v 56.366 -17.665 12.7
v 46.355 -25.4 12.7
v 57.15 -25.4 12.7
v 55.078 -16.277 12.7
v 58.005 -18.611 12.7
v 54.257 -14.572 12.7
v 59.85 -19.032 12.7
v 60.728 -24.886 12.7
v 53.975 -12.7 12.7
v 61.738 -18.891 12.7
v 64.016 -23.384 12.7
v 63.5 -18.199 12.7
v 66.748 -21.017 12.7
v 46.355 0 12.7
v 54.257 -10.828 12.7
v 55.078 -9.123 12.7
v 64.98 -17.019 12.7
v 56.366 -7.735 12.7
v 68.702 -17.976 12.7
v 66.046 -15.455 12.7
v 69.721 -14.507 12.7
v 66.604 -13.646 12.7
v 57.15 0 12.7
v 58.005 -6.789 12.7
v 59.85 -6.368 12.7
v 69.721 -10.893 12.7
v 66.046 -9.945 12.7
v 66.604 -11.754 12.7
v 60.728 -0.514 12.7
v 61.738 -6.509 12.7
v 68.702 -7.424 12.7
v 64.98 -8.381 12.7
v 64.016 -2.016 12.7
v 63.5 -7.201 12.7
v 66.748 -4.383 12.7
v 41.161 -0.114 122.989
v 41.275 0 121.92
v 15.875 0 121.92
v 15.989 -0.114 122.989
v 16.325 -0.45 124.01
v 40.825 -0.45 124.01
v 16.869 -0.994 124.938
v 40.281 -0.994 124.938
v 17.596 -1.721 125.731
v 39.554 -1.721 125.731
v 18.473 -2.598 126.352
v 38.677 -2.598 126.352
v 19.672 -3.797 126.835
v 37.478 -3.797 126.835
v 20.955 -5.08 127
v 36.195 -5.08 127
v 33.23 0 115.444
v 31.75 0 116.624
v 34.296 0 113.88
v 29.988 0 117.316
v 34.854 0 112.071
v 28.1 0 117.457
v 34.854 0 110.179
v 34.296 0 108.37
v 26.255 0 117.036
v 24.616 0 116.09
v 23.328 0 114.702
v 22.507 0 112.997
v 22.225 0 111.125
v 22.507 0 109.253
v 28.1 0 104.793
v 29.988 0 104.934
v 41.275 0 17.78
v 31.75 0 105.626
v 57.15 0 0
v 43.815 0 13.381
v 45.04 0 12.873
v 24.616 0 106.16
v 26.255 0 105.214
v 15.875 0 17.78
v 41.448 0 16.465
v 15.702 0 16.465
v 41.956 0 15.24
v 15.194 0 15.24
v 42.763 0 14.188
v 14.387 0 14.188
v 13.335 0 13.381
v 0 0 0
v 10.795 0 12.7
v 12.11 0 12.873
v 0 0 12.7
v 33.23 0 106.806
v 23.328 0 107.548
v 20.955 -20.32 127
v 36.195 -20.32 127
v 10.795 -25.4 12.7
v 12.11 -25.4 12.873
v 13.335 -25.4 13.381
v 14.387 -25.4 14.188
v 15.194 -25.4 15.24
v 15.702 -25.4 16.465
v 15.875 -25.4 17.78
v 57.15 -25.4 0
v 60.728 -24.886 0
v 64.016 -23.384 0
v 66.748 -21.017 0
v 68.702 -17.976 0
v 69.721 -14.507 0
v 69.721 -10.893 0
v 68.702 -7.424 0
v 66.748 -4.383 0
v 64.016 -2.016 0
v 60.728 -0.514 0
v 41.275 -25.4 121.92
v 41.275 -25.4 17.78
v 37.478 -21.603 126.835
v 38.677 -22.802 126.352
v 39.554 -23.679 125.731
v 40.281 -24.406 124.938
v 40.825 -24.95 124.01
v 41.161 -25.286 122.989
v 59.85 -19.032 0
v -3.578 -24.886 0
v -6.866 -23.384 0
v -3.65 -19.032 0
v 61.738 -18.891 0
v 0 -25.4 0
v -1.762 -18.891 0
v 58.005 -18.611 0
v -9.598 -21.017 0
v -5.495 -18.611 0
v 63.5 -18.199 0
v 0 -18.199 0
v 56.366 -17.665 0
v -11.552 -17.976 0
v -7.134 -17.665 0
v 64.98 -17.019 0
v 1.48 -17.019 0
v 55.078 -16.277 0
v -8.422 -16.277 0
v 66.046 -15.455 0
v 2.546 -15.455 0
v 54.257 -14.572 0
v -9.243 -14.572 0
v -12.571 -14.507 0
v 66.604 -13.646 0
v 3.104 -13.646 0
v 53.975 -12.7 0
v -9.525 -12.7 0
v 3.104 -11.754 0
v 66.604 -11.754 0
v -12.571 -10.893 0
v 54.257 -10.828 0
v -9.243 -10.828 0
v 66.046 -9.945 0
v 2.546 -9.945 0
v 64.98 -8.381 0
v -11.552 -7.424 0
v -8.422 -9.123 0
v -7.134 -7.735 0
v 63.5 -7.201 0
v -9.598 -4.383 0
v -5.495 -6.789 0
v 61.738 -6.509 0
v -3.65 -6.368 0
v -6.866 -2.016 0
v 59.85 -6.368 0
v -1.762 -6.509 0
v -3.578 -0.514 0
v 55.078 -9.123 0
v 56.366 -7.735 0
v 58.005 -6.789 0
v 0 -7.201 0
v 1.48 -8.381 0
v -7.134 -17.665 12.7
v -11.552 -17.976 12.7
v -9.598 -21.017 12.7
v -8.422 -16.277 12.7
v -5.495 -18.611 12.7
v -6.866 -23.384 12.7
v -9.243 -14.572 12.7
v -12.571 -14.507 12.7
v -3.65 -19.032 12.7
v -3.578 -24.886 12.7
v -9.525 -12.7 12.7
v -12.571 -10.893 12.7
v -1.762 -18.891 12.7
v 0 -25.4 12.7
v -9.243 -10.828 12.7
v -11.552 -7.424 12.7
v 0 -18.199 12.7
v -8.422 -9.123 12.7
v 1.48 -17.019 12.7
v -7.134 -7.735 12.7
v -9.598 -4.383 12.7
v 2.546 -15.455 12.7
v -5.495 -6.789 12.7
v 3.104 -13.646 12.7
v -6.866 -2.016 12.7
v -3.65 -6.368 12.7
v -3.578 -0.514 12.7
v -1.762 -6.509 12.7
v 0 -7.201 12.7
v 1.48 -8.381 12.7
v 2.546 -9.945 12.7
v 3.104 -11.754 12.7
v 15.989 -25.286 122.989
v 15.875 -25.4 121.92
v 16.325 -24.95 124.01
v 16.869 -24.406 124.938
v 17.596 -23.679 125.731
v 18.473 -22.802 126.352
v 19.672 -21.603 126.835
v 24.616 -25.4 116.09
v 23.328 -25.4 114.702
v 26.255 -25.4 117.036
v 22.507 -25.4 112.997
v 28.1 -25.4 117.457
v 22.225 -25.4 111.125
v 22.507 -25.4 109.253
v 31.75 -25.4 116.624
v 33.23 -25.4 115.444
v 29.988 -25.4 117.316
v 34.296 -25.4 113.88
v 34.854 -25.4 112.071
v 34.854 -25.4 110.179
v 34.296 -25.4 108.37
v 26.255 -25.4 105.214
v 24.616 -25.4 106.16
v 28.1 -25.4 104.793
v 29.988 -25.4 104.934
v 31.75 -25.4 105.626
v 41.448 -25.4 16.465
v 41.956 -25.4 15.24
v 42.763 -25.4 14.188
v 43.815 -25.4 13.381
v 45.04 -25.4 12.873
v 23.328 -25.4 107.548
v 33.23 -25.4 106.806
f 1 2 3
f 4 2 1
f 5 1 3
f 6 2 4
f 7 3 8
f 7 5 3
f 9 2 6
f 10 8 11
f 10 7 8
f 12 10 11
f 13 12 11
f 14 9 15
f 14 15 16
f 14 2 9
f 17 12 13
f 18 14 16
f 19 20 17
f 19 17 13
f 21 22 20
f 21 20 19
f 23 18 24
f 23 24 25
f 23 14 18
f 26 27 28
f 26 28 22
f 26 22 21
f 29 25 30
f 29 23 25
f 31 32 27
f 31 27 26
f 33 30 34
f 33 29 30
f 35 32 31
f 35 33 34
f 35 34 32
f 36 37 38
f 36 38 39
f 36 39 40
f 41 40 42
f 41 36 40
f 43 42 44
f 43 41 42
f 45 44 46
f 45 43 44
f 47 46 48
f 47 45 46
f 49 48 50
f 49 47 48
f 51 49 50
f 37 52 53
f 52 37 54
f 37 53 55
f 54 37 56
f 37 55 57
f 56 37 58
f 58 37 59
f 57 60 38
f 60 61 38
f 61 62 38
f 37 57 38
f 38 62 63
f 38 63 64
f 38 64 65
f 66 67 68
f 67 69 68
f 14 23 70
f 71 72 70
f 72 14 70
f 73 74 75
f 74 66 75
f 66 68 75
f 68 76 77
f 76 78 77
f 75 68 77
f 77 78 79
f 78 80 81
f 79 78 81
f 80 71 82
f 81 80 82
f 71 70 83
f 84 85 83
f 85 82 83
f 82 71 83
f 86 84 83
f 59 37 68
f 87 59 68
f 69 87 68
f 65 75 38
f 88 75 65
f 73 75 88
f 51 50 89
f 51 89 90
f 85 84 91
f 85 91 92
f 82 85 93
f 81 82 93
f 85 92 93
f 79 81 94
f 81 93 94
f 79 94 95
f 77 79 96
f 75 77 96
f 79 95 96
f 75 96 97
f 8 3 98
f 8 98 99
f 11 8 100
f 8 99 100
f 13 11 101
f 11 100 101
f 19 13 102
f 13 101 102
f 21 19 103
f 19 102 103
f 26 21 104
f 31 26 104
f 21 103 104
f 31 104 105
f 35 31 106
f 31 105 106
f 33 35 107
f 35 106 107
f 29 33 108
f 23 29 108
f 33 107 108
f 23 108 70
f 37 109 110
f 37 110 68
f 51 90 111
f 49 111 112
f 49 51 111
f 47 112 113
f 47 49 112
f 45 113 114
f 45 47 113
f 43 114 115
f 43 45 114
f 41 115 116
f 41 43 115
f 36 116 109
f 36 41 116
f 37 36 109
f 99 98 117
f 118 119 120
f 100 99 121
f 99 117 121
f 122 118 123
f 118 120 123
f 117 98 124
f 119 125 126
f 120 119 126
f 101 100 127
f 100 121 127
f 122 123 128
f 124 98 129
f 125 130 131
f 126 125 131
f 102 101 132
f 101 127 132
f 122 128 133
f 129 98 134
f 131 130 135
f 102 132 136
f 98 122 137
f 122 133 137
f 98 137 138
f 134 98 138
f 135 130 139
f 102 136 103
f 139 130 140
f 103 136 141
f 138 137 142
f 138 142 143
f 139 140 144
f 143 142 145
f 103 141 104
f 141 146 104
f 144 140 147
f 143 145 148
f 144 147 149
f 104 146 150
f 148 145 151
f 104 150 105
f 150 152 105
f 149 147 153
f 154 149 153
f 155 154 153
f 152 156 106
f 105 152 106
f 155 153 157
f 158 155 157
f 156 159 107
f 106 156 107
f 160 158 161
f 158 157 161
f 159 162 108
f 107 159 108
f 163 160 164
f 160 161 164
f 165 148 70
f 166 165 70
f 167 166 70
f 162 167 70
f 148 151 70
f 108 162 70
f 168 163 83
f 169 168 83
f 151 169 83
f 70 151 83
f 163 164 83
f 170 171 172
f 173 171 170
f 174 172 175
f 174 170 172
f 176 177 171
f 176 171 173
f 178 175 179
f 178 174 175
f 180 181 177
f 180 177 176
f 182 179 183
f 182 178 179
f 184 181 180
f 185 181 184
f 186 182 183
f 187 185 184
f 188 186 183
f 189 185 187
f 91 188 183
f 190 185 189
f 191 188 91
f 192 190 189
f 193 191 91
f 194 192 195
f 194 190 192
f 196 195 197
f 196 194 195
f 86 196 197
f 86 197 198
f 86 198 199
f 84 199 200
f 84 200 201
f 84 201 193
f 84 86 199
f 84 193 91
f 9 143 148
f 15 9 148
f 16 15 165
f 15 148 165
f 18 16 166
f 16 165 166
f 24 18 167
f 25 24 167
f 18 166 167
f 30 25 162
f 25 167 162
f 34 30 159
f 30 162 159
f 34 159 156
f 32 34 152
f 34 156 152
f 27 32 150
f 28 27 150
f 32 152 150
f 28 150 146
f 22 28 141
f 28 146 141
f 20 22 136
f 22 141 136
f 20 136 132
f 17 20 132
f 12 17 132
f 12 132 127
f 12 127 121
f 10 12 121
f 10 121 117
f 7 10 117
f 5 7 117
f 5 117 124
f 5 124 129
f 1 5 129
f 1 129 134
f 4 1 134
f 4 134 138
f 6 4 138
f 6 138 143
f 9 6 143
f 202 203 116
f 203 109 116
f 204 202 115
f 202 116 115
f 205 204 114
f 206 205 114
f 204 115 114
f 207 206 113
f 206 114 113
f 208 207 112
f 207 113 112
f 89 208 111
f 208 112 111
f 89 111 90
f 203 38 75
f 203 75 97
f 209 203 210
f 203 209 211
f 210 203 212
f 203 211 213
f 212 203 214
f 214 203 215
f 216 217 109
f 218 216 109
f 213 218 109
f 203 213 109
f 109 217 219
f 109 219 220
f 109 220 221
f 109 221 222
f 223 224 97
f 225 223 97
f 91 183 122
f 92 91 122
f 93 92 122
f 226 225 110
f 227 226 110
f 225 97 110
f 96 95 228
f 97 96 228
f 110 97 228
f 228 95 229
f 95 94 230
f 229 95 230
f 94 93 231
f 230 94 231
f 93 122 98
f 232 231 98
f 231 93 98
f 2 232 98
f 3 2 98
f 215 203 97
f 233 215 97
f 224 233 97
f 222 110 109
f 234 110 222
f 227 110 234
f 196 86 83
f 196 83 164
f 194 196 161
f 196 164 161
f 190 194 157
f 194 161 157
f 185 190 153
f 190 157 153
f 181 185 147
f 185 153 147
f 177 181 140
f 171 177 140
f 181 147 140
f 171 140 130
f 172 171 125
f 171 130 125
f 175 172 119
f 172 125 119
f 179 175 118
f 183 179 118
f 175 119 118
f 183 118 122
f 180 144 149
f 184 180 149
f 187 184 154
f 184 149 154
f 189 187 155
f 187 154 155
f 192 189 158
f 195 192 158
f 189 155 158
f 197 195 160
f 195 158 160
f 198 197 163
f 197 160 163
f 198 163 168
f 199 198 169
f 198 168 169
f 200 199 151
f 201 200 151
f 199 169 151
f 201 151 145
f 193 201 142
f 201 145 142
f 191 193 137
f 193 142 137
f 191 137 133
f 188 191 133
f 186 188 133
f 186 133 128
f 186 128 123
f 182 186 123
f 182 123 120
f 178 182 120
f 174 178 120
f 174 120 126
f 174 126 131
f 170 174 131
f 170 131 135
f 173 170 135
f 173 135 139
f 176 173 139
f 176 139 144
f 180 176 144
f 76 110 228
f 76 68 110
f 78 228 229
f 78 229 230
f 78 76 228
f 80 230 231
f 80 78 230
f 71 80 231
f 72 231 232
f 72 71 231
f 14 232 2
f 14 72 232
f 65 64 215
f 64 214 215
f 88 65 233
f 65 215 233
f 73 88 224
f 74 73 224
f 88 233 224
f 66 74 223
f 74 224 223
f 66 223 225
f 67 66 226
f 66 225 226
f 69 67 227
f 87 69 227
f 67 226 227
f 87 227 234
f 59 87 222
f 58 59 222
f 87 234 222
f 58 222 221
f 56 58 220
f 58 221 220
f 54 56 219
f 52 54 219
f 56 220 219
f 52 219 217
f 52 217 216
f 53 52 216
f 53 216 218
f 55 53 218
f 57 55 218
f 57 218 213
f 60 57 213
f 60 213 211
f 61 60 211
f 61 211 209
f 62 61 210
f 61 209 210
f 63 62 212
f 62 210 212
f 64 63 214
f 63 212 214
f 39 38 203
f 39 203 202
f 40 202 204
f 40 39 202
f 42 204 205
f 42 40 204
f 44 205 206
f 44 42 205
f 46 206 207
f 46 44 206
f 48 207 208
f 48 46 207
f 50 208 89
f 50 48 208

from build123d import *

# Parameters (mm, degrees)
F0_W     = 25.4
F0_H     = 25.4
F1_DEPTH = 12.7
F3_W     = 25.4
F3_H     = 25.4
F5_R     = 5.08
F7_D     = 12.7
F7_DEPTH = 25.4
F7_TIP   = 3.8154649308
F9_D     = 12.7
F9_DEPTH = 25.4
F9_TIP   = 3.8154649308


with BuildPart() as f1:
    # F0 (on Top) → F1 (new body)
    with BuildSketch(Plane.XY):
        with BuildLine():
            Line((15.875, 0), (0, 0))
            ThreePointArc((0, 0), (-12.7, -12.7), (0, -25.4))
            Line((0, -25.4), (15.875, -25.4))
            Line((15.875, -25.4), (15.875, 0))
        make_face()
        with Locations((28.575, -12.7)):
            Rectangle(F0_W, F0_H)
        with BuildLine():
            Line((57.15, 0), (41.275, 0))
            Line((41.275, 0), (41.275, -25.4))
            Line((41.275, -25.4), (57.15, -25.4))
            ThreePointArc((57.15, -25.4), (69.85, -12.7), (57.15, 0))
        make_face()
    extrude(amount=F1_DEPTH)

    # F0 (on Top) → F4 section 0
    with BuildSketch(Plane.XY):
        with Locations((28.575, -12.7)):
            Rectangle(F0_W, F0_H)
    # F3 (on offset) → F4 section 1
    with BuildSketch(Plane.XY.offset(127)):
        with Locations((28.575, -12.7)):
            Rectangle(F3_W, F3_H)
    loft()

    # F5
    f5_edges = [f1.edges().sort_by_distance(p)[0] for p in [
        (41.275, -12.7, 12.7),
        (15.875, -12.7, 12.7),
        (28.575, 0, 127),
        (15.875, -12.7, 127),
        (28.575, -25.4, 127),
        (41.275, -12.7, 127),
    ]]
    fillet(f5_edges, radius=F5_R)

    # F7
    with Locations(Plane(origin=(0, 0, 0), x_dir=(1, 0, 0), z_dir=(0, 1, 0))):
        with Locations((28.575, -111.125)):
            Hole(F7_D / 2, depth=F7_DEPTH)
            with Locations((0, 0, -(F7_DEPTH + F7_TIP / 2))):  # 118° drill point
                Cone(0, F7_D / 2, F7_TIP, mode=Mode.SUBTRACT)

    # F9
    with Locations(Plane.XY.offset(12.7)):
        with Locations((-3.175, -12.7), (60.325, -12.7)):
            Hole(F9_D / 2, depth=F9_DEPTH)
            with Locations((0, 0, -(F9_DEPTH + F9_TIP / 2))):  # 118° drill point
                Cone(0, F9_D / 2, F9_TIP, mode=Mode.SUBTRACT)


solid = f1.part
